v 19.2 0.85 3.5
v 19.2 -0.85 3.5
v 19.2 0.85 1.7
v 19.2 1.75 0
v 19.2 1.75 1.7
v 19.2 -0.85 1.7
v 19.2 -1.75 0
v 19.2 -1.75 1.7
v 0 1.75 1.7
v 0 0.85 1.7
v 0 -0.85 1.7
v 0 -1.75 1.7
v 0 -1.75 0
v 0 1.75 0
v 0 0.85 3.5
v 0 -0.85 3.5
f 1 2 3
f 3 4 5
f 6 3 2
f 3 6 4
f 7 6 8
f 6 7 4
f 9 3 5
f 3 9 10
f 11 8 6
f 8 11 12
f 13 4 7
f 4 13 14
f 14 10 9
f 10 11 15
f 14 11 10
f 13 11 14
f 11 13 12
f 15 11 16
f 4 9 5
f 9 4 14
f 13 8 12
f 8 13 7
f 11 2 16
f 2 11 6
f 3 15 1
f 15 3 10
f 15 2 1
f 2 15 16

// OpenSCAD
// file: link.scad
// ./stickies/link.scad
// Copyright (C) 2013 Christopher Robertsi

include <parameters.scad>;

module link(length, width, height) {

    union() {
        translate( v = [0, -width/2, -width/2.3] ) cube( size = [length, width, height], center = false );
        translate( v = [0, height/2, -width/2.3] ) rotate( a = [90,0,0] ) cube( size = [length, width, height], center = false );
    }

}
// file: balljoint.scad
// ./stickies/balljoint.scad
// Copyright (C) 2013 Christopher Robertsi

include<parameters.scad>;
include<link.scad>;

module ball_joint() {

    difference() {

        union() {
            sphere( r = ball_diameter/2, $fn = precision );
            translate( v = [0, 0, -ball_diameter/2 - rod_length] ) {
                cylinder( h = rod_length + ball_diameter/4, r = rod_diameter/2, $fn = precision );
            }
        }

        union() {
            translate( v = [0, 0, -ball_diameter/2] ) rotate( a = [0, 90, 0] ) link(rod_length + link_gap, rod_diameter/2 + link_gap*2, thickness + link_gap*2);
        }

    }

}

module ball_socket(c) {

    rotate( a = [180, 0, 0] )
    difference() {

        // Things that exist
        union() {
            sphere( r = (ball_outer_diameter/2), $fn = precision );
            translate( v = [0, 0, ball_outer_diameter/2 - thickness] ) {
                cylinder( h = rod_length + thickness, r = rod_diameter/2, $fn = precision );
            }
        }

        // Things that don't exist
        union() {
            sphere( r = ball_diameter/2 + socket_gap, $fn = precision );

            // Side holes
            for (b = [180 : 11.25 : c] ) {
                for (a = [0] ) {
                    rotate( a = [b, 0, a] ) {
                        translate( v = [0, ball_outer_diameter/2, 0] ) {
                            rotate( a = [90, 0, 0] ) {
                                cylinder( h = ball_outer_diameter/2, r1 = rod_diameter/2 * 2, r2 = 0, $fn = precision );
                            }
                        }
                    }
                }
            }

            translate( v = [0, 0, rod_length + ball_outer_diameter/2 + 0.1] ) rotate( a = [0, 90, 0] ) link(rod_length + link_gap, rod_diameter/2 + link_gap*2, thickness + link_gap*2);

        }
    
    }

}
// file: parameters.scad
// ./stickies/parameters.scad
// Copyright (C) 2013 Christopher Robertsi

// Global Parameters
ball_diameter       = 10;  // Diameter of ball
thickness           = 1.7; // Thickness of socket
socket_gap          = 0.1; // Gap between Ball and Socket
link_gap            = 0.2; // Linking gap
rod_diameter        = 7; 
rod_length          = 10;
precision           = 100;
ball_outer_diameter = ball_diameter + thickness * 2;
// main file
// ./stickies/leg.scad
// Copyright (C) 2013 Christopher Robertsi

include<parameters.scad>;
include<balljoint.scad>;
include<link.scad>;

//translate( v = [0, 0, rod_length + ball_diameter/2] ) rotate( a = [0, 0, 0] ) ball_joint();
//translate( v = [0, 0, rod_length + ball_outer_diameter/2] ) rotate( a = [0, 0, 0] ) ball_socket(270);
translate( v = [0, 0, rod_diameter/2/2.3] ) link(rod_length*2 - link_gap *4, rod_diameter/2, thickness);
